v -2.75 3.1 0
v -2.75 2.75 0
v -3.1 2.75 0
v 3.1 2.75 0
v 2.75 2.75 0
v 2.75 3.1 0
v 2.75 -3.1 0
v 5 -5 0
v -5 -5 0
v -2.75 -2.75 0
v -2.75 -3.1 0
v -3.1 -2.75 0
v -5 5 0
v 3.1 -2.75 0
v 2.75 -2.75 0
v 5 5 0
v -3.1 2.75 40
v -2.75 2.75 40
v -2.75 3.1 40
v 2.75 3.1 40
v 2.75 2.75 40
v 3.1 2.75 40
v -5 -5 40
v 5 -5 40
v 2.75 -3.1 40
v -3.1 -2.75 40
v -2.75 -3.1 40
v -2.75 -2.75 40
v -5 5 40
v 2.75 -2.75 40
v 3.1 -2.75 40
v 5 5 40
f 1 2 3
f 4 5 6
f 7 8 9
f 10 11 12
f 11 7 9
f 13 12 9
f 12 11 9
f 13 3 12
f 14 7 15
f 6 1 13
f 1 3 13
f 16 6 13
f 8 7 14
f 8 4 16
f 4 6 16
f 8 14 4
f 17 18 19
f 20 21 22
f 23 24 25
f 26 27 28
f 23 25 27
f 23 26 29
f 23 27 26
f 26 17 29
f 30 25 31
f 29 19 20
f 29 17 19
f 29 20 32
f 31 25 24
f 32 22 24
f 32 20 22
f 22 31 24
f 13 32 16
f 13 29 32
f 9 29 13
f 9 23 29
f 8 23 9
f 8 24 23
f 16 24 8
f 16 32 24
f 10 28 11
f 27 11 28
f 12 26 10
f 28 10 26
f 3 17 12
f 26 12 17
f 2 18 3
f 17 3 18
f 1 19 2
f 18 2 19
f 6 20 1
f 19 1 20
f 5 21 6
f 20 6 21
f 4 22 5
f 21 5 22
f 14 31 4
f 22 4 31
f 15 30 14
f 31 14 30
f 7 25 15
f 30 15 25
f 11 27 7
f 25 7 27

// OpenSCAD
// MakerBeam base profile and common dimensions
// MakerBeam: 10x10mm aluminium extrusion with T-slot groove
// Hardware: M3 bolts and T-slot nuts

// --- Core dimensions ---
MB_SIZE        = 10;   // Extrusion cross-section (mm)
MB_SLOT_WIDTH  = 6.2;  // T-slot opening width (mm)
MB_SLOT_DEPTH  = 4.5;  // T-slot groove depth (mm)
MB_BOLT_DIAM   = 3.2;  // M3 clearance hole diameter (mm)
MB_NUT_WIDTH   = 5.5;  // T-nut width across flats (mm)
MB_NUT_HEIGHT  = 2.4;  // T-nut height (mm)

// --- Print tolerances ---
PRINT_TOL      = 0.2;  // General tolerance for printed-to-printed fits (mm)
SLOT_TOL       = 0.3;  // Extra tolerance for T-slot fits (mm)

// --- Utility modules ---

// A single MakerBeam extrusion segment of given length along the Z axis.
module makerbeam(length, color_val = "silver") {
    color(color_val)
    linear_extrude(length)
    difference() {
        square([MB_SIZE, MB_SIZE], center = true);
        // Four T-slot grooves (top, bottom, left, right)
        for (rot = [0, 90, 180, 270]) {
            rotate([0, 0, rot])
            translate([MB_SIZE / 2 - MB_SLOT_DEPTH, 0])
            union() {
                square([MB_SLOT_DEPTH, MB_SLOT_WIDTH], center = true);
                translate([-MB_SLOT_DEPTH / 2, 0])
                square([MB_SLOT_DEPTH / 2, MB_BOLT_DIAM], center = true);
            }
        }
    }
}

// A clearance hole for an M3 bolt.
module m3_hole(depth = 20) {
    cylinder(h = depth, d = MB_BOLT_DIAM, center = true, $fn = 20);
}

// A slot for a MakerBeam T-nut (laid flat, bolt axis along Z).
module t_nut_slot(depth = MB_SLOT_DEPTH + SLOT_TOL) {
    cube([MB_NUT_WIDTH + SLOT_TOL, MB_NUT_HEIGHT + SLOT_TOL, depth], center = true);
}

// Preview showing a short section of MakerBeam.
makerbeam(40);
